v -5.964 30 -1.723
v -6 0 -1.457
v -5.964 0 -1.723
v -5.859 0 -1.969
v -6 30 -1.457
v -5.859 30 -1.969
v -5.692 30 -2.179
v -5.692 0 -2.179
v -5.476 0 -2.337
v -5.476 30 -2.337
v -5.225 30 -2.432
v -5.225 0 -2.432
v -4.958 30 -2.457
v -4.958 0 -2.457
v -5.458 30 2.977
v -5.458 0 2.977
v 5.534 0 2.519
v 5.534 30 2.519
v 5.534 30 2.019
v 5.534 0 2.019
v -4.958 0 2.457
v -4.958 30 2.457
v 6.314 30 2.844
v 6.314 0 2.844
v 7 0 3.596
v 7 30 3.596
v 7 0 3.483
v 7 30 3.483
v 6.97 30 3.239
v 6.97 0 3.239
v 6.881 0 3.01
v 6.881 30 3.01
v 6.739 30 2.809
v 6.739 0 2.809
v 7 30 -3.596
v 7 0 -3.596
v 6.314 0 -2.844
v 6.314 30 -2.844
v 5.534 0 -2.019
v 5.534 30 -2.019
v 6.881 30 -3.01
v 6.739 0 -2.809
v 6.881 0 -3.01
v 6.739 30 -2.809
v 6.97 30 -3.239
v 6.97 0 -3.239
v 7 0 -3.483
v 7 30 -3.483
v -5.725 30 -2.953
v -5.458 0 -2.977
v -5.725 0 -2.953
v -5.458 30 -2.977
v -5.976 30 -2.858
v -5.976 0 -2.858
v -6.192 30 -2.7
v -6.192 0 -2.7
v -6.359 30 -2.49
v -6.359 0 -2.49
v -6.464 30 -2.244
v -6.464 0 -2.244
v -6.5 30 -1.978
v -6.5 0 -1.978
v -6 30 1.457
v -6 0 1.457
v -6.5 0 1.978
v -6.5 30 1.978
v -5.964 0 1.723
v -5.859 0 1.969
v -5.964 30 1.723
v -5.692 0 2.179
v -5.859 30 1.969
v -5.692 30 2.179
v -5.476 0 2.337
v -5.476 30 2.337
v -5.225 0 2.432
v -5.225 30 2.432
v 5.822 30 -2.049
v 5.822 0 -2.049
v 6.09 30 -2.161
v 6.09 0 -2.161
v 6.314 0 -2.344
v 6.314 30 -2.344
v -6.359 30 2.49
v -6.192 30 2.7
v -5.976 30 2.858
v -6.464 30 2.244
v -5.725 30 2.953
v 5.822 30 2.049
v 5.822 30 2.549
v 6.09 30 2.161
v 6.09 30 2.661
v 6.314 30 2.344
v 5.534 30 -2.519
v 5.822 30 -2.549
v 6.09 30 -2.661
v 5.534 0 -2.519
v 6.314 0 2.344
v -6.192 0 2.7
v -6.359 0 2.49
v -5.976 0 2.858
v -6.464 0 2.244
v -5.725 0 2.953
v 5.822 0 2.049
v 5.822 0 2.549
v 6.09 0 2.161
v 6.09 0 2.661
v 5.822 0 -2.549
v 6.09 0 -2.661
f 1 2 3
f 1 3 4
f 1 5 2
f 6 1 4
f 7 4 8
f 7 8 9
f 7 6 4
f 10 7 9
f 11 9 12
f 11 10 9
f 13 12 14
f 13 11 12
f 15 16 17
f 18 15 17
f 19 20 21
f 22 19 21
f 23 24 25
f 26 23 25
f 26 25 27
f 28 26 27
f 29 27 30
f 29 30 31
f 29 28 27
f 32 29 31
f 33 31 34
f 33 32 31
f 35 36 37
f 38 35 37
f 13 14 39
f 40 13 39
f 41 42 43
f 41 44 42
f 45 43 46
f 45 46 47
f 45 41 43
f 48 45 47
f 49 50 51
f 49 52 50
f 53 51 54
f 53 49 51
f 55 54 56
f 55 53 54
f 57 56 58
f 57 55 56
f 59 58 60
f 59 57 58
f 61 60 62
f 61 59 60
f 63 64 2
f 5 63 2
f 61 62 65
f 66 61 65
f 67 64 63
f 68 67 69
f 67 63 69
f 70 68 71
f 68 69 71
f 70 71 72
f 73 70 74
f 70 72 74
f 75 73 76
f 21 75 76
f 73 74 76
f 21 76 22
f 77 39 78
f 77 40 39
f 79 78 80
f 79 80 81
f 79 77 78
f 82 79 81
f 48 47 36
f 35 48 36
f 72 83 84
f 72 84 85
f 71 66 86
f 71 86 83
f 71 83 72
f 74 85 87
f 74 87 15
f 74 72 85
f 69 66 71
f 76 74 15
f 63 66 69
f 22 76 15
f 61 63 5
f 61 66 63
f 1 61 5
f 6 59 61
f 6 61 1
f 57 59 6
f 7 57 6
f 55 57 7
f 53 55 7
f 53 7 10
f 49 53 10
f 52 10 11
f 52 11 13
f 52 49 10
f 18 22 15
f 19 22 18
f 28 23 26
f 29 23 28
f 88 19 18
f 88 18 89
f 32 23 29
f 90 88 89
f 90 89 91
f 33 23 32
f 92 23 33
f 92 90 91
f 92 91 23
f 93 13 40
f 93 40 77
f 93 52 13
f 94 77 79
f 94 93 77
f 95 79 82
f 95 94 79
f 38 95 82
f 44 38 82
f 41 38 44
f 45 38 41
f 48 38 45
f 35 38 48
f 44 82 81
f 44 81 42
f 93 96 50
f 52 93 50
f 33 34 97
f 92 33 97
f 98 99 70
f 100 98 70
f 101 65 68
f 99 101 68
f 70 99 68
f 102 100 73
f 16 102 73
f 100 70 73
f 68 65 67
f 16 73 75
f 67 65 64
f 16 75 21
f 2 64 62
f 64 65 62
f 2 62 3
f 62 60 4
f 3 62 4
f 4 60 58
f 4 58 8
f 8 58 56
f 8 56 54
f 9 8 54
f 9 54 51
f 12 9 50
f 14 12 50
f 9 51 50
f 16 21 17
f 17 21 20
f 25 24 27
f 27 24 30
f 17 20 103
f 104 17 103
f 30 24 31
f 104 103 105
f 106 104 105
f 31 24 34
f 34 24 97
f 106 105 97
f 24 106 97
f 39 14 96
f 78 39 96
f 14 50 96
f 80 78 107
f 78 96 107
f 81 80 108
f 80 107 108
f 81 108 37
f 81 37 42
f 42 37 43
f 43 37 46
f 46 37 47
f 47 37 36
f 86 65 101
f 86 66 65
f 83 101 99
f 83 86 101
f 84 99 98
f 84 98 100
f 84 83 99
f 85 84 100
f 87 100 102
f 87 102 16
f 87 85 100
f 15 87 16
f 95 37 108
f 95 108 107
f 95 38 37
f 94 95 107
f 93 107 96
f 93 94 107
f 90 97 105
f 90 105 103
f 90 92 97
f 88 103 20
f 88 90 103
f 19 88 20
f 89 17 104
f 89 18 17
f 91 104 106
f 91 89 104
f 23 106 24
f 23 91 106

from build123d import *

# Parameters (mm, degrees)
BOSS_EXTRUDE1_DEPTH = 30
FILLET1_R           = 1


with BuildPart() as part:
    # Sketch1 → Boss-Extrude1 (new body)
    with BuildSketch(Plane(origin=(0, 0, 0), x_dir=(1, 0, 0), z_dir=(0, 1, 0))):
        Polygon((-6, -2.5), (-6, 2.5), (6, 2), (7, 3.09567943), (7, 3.59567943), (6, 2.5), (-6.5, 3.020833333), (-6.5, -3.020833333), (6, -2.5), (7, -3.59567943), (7, -3.09567943), (6, -2), align=None)
    extrude(amount=BOSS_EXTRUDE1_DEPTH)

    # Fillet1
    fillet1_edges = [part.edges().sort_by_distance(p)[0] for p in [
        (-6.5, 15, 3.020833333),
        (-6.5, 15, -3.020833333),
        (6, 15, -2.5),
        (7, 15, -3.09567943),
        (6, 15, -2),
        (-6, 15, -2.5),
        (-6, 15, 2.5),
        (6, 15, 2),
        (7, 15, 3.09567943),
        (6, 15, 2.5),
    ]]
    fillet(fillet1_edges, radius=FILLET1_R)


solid = part.part
